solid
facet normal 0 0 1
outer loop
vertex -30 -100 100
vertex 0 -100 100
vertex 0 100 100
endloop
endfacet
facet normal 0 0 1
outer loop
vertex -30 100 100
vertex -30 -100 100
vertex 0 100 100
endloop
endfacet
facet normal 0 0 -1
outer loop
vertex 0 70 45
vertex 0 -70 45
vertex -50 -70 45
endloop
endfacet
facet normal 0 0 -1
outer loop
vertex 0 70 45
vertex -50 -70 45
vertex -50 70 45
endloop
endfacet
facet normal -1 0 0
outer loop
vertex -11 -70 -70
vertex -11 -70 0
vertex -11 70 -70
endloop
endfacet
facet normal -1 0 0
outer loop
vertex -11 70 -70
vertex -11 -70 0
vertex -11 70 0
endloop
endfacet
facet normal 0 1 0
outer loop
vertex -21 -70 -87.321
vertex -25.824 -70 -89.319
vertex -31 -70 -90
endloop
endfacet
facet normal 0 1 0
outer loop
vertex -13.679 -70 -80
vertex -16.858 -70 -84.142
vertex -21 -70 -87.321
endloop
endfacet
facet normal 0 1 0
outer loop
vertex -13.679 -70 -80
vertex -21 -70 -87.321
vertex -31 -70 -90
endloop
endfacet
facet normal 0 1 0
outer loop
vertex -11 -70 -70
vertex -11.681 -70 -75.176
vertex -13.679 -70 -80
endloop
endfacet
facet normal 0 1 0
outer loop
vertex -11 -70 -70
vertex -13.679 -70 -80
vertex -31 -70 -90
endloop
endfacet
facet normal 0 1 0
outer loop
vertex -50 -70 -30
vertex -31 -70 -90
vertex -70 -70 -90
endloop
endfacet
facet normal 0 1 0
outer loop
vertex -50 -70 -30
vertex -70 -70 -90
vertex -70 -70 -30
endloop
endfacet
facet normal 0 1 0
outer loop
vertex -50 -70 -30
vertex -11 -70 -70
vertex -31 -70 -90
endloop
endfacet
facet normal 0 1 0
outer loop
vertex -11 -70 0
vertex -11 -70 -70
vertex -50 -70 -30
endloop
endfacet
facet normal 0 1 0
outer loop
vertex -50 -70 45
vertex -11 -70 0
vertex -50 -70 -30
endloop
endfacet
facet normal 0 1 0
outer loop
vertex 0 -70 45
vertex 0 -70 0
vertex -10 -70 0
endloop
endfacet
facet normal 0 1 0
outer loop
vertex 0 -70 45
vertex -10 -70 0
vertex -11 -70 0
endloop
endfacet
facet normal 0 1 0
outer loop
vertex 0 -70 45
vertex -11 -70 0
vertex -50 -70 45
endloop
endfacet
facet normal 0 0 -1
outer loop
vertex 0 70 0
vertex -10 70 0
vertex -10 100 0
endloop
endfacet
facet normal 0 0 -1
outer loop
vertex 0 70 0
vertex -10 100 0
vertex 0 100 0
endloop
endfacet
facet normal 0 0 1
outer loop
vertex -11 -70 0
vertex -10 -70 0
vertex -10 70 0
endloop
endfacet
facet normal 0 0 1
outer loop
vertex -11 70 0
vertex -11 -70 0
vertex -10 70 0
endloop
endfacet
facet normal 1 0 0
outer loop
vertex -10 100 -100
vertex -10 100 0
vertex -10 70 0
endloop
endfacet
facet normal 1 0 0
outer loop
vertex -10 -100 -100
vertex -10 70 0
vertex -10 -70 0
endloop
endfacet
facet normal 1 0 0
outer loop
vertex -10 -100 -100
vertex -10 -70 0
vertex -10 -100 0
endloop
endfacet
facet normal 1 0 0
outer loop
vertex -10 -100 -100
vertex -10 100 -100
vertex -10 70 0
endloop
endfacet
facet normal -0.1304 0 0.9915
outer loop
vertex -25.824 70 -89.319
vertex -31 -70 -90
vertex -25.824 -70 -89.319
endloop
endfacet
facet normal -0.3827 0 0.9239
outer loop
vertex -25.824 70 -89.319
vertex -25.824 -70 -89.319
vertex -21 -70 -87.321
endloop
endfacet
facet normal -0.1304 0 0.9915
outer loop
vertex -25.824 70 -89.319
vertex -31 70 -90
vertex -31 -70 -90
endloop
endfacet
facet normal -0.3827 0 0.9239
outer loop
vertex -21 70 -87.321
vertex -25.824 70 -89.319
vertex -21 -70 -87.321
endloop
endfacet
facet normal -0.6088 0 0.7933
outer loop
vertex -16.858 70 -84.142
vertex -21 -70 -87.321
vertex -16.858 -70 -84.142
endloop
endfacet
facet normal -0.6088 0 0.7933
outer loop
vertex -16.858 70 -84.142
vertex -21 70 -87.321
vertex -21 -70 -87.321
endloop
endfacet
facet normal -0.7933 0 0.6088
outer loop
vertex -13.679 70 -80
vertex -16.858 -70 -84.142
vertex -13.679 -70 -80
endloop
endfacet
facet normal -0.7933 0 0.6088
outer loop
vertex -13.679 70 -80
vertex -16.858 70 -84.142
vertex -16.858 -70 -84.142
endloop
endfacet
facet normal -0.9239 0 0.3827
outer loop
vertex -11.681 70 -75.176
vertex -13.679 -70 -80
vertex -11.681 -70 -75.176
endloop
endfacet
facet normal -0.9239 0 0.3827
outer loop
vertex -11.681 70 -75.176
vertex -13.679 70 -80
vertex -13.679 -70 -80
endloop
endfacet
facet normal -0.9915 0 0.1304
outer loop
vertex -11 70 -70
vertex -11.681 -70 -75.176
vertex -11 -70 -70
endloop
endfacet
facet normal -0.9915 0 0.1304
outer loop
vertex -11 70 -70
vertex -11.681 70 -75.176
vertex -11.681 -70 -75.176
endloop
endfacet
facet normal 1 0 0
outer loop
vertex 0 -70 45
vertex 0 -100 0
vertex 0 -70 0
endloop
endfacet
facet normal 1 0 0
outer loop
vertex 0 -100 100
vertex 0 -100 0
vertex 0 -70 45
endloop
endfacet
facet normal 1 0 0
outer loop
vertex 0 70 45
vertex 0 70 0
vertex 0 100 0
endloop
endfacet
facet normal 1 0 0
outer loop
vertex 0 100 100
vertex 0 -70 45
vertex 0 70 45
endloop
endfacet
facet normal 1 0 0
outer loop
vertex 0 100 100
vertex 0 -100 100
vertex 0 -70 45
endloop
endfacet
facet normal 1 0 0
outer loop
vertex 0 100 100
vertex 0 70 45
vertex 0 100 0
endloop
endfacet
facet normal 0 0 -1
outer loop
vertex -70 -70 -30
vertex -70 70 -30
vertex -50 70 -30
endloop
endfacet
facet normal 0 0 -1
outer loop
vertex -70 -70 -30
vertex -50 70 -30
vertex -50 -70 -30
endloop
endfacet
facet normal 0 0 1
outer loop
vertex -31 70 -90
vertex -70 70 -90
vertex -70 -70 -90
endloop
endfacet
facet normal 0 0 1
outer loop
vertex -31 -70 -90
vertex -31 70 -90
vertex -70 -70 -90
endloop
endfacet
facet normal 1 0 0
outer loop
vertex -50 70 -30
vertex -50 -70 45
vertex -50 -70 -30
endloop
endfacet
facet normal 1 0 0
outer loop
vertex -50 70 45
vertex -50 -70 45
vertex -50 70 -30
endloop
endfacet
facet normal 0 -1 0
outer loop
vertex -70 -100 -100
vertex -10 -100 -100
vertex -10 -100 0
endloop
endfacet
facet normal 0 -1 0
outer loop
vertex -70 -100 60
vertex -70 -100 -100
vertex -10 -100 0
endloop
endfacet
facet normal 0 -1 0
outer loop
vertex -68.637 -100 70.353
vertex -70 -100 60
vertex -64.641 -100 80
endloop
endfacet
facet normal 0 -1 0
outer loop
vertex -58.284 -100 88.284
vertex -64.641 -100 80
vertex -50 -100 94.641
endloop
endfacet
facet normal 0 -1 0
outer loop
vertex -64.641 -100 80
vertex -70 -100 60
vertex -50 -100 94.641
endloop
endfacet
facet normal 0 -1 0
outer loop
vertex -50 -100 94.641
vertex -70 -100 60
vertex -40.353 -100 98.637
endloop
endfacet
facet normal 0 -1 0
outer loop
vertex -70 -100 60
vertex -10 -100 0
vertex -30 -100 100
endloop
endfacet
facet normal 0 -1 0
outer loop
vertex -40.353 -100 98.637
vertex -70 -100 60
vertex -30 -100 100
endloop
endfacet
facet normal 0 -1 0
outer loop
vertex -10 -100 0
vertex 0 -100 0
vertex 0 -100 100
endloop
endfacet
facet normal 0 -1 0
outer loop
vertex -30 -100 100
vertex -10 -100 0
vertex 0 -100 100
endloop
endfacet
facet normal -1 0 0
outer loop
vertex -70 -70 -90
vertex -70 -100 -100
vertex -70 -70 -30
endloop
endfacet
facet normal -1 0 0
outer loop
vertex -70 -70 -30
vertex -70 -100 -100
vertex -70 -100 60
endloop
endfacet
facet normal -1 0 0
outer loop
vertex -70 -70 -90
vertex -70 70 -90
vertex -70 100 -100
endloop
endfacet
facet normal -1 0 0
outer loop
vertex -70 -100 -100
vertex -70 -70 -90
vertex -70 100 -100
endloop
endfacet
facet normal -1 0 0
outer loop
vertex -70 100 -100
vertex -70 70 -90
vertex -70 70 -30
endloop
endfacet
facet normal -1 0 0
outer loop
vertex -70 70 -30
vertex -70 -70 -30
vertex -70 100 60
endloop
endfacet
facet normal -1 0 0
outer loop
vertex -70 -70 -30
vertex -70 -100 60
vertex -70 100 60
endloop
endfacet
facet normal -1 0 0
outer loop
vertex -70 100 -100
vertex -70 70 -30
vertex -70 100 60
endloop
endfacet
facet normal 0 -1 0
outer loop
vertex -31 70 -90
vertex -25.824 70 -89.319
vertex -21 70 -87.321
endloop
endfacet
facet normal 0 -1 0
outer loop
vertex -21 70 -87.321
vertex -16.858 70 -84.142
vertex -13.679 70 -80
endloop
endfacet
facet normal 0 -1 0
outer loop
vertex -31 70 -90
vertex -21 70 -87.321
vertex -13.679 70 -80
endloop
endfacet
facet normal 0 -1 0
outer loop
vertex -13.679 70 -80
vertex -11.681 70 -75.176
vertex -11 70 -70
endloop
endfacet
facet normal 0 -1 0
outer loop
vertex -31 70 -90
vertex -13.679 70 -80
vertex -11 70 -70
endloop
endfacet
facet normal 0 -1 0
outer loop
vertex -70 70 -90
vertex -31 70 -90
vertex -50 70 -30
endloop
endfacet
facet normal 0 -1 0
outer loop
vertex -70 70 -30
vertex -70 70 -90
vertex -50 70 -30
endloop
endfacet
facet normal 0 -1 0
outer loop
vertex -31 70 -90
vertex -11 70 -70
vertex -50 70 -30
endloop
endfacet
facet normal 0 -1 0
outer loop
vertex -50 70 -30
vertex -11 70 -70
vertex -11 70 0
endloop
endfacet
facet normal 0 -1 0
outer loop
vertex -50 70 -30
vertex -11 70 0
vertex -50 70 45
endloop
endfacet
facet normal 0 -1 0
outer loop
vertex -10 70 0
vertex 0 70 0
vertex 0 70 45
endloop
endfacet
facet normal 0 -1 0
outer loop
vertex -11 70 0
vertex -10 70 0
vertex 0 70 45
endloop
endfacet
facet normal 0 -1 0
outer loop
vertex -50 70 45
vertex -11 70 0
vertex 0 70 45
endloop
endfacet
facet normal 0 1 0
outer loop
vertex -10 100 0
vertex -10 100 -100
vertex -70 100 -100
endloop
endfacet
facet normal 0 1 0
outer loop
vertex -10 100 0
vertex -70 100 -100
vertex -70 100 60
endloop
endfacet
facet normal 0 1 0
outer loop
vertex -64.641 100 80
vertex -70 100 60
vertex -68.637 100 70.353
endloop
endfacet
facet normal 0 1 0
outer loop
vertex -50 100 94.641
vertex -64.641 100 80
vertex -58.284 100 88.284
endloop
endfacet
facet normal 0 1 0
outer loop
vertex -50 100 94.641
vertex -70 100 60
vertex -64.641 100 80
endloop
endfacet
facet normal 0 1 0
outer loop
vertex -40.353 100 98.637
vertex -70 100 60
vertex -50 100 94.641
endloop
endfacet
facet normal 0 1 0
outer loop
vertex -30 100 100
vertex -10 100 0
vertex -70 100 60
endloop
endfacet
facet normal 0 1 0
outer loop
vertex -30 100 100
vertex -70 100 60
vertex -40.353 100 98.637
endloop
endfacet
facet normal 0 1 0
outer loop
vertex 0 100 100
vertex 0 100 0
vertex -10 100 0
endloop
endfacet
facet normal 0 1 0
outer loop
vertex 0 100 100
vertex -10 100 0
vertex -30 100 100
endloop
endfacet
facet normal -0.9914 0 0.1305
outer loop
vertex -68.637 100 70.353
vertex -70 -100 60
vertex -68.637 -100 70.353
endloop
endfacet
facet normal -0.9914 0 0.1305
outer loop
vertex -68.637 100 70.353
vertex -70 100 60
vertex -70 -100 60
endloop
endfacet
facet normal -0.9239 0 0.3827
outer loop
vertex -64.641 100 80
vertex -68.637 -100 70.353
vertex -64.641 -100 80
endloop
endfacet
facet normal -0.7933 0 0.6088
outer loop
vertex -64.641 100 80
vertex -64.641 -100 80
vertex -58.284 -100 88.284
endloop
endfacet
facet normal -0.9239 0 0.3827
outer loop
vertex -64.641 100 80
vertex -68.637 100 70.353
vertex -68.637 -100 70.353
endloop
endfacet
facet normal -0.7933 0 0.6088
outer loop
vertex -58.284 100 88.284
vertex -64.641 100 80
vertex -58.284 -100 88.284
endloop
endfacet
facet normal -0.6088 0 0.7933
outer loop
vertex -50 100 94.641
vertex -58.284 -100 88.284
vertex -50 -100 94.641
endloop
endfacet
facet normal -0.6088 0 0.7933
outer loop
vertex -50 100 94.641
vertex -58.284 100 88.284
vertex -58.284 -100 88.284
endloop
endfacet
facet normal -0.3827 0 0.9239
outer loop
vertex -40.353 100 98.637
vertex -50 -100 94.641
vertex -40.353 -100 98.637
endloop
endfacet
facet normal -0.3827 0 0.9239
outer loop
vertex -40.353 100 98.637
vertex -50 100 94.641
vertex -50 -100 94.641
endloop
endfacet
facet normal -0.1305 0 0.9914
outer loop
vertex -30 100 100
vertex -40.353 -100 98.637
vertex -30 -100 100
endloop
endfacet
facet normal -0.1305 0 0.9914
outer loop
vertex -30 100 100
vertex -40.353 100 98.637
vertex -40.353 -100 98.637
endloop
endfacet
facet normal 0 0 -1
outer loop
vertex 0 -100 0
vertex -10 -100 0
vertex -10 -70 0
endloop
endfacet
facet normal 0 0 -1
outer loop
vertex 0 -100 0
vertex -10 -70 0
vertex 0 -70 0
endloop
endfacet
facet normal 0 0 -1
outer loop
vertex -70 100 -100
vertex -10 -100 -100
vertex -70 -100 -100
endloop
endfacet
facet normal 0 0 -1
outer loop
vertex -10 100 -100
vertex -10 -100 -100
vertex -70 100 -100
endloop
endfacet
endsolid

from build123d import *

# Parameters (mm, degrees)
F0_W     = 200
F0_H     = 200
F1_DEPTH = 70
F2_W     = 10
F2_H     = 200
F3_DEPTH = 100
F4_W     = 140
F4_H     = 45
F5_DEPTH = 50
F6_W     = 39
F6_H     = 140
F7_DEPTH = 90
F8_W     = 140
F8_H     = 60
F9_DEPTH = 59
F10_R    = 20
F11_R    = 40


with BuildPart() as f1:
    # F0 (on Right) → F1 (new body)
    with BuildSketch(Plane.YZ):
        Rectangle(F0_W, F0_H)
    extrude(amount=-F1_DEPTH)

    # F2 (on face) → F3 (cut)
    with BuildSketch(Plane(origin=(0, 0, -100), x_dir=(1, 0, 0), z_dir=(0, 0, -1))):
        with Locations((-5, 0)):
            Rectangle(F2_W, F2_H)
    extrude(amount=-F3_DEPTH, mode=Mode.SUBTRACT)

    # F4 (on face) → F5 (cut)
    with BuildSketch(Plane.YZ):
        with Locations((0, 22.5)):
            Rectangle(F4_W, F4_H)
    extrude(amount=-F5_DEPTH, mode=Mode.SUBTRACT)

    # F6 (on face) → F7 (cut)
    with BuildSketch(Plane.XY):
        with Locations((-30.5, 0)):
            Rectangle(F6_W, F6_H)
    extrude(amount=-F7_DEPTH, mode=Mode.SUBTRACT)

    # F8 (on face) → F9 (cut)
    with BuildSketch(Plane(origin=(-70, 0, 0), x_dir=(0, -1, 0), z_dir=(-1, 0, 0))):
        with Locations((0, -60)):
            Rectangle(F8_W, F8_H)
    extrude(amount=-F9_DEPTH, mode=Mode.SUBTRACT)

    # F10
    f10_edges = [f1.edges().sort_by_distance(p)[0] for p in [
        (-11, 0, -90),
    ]]
    fillet(f10_edges, radius=F10_R)

    # F11
    f11_edges = [f1.edges().sort_by_distance(p)[0] for p in [
        (-70, 0, 100),
    ]]
    fillet(f11_edges, radius=F11_R)


solid = f1.part
